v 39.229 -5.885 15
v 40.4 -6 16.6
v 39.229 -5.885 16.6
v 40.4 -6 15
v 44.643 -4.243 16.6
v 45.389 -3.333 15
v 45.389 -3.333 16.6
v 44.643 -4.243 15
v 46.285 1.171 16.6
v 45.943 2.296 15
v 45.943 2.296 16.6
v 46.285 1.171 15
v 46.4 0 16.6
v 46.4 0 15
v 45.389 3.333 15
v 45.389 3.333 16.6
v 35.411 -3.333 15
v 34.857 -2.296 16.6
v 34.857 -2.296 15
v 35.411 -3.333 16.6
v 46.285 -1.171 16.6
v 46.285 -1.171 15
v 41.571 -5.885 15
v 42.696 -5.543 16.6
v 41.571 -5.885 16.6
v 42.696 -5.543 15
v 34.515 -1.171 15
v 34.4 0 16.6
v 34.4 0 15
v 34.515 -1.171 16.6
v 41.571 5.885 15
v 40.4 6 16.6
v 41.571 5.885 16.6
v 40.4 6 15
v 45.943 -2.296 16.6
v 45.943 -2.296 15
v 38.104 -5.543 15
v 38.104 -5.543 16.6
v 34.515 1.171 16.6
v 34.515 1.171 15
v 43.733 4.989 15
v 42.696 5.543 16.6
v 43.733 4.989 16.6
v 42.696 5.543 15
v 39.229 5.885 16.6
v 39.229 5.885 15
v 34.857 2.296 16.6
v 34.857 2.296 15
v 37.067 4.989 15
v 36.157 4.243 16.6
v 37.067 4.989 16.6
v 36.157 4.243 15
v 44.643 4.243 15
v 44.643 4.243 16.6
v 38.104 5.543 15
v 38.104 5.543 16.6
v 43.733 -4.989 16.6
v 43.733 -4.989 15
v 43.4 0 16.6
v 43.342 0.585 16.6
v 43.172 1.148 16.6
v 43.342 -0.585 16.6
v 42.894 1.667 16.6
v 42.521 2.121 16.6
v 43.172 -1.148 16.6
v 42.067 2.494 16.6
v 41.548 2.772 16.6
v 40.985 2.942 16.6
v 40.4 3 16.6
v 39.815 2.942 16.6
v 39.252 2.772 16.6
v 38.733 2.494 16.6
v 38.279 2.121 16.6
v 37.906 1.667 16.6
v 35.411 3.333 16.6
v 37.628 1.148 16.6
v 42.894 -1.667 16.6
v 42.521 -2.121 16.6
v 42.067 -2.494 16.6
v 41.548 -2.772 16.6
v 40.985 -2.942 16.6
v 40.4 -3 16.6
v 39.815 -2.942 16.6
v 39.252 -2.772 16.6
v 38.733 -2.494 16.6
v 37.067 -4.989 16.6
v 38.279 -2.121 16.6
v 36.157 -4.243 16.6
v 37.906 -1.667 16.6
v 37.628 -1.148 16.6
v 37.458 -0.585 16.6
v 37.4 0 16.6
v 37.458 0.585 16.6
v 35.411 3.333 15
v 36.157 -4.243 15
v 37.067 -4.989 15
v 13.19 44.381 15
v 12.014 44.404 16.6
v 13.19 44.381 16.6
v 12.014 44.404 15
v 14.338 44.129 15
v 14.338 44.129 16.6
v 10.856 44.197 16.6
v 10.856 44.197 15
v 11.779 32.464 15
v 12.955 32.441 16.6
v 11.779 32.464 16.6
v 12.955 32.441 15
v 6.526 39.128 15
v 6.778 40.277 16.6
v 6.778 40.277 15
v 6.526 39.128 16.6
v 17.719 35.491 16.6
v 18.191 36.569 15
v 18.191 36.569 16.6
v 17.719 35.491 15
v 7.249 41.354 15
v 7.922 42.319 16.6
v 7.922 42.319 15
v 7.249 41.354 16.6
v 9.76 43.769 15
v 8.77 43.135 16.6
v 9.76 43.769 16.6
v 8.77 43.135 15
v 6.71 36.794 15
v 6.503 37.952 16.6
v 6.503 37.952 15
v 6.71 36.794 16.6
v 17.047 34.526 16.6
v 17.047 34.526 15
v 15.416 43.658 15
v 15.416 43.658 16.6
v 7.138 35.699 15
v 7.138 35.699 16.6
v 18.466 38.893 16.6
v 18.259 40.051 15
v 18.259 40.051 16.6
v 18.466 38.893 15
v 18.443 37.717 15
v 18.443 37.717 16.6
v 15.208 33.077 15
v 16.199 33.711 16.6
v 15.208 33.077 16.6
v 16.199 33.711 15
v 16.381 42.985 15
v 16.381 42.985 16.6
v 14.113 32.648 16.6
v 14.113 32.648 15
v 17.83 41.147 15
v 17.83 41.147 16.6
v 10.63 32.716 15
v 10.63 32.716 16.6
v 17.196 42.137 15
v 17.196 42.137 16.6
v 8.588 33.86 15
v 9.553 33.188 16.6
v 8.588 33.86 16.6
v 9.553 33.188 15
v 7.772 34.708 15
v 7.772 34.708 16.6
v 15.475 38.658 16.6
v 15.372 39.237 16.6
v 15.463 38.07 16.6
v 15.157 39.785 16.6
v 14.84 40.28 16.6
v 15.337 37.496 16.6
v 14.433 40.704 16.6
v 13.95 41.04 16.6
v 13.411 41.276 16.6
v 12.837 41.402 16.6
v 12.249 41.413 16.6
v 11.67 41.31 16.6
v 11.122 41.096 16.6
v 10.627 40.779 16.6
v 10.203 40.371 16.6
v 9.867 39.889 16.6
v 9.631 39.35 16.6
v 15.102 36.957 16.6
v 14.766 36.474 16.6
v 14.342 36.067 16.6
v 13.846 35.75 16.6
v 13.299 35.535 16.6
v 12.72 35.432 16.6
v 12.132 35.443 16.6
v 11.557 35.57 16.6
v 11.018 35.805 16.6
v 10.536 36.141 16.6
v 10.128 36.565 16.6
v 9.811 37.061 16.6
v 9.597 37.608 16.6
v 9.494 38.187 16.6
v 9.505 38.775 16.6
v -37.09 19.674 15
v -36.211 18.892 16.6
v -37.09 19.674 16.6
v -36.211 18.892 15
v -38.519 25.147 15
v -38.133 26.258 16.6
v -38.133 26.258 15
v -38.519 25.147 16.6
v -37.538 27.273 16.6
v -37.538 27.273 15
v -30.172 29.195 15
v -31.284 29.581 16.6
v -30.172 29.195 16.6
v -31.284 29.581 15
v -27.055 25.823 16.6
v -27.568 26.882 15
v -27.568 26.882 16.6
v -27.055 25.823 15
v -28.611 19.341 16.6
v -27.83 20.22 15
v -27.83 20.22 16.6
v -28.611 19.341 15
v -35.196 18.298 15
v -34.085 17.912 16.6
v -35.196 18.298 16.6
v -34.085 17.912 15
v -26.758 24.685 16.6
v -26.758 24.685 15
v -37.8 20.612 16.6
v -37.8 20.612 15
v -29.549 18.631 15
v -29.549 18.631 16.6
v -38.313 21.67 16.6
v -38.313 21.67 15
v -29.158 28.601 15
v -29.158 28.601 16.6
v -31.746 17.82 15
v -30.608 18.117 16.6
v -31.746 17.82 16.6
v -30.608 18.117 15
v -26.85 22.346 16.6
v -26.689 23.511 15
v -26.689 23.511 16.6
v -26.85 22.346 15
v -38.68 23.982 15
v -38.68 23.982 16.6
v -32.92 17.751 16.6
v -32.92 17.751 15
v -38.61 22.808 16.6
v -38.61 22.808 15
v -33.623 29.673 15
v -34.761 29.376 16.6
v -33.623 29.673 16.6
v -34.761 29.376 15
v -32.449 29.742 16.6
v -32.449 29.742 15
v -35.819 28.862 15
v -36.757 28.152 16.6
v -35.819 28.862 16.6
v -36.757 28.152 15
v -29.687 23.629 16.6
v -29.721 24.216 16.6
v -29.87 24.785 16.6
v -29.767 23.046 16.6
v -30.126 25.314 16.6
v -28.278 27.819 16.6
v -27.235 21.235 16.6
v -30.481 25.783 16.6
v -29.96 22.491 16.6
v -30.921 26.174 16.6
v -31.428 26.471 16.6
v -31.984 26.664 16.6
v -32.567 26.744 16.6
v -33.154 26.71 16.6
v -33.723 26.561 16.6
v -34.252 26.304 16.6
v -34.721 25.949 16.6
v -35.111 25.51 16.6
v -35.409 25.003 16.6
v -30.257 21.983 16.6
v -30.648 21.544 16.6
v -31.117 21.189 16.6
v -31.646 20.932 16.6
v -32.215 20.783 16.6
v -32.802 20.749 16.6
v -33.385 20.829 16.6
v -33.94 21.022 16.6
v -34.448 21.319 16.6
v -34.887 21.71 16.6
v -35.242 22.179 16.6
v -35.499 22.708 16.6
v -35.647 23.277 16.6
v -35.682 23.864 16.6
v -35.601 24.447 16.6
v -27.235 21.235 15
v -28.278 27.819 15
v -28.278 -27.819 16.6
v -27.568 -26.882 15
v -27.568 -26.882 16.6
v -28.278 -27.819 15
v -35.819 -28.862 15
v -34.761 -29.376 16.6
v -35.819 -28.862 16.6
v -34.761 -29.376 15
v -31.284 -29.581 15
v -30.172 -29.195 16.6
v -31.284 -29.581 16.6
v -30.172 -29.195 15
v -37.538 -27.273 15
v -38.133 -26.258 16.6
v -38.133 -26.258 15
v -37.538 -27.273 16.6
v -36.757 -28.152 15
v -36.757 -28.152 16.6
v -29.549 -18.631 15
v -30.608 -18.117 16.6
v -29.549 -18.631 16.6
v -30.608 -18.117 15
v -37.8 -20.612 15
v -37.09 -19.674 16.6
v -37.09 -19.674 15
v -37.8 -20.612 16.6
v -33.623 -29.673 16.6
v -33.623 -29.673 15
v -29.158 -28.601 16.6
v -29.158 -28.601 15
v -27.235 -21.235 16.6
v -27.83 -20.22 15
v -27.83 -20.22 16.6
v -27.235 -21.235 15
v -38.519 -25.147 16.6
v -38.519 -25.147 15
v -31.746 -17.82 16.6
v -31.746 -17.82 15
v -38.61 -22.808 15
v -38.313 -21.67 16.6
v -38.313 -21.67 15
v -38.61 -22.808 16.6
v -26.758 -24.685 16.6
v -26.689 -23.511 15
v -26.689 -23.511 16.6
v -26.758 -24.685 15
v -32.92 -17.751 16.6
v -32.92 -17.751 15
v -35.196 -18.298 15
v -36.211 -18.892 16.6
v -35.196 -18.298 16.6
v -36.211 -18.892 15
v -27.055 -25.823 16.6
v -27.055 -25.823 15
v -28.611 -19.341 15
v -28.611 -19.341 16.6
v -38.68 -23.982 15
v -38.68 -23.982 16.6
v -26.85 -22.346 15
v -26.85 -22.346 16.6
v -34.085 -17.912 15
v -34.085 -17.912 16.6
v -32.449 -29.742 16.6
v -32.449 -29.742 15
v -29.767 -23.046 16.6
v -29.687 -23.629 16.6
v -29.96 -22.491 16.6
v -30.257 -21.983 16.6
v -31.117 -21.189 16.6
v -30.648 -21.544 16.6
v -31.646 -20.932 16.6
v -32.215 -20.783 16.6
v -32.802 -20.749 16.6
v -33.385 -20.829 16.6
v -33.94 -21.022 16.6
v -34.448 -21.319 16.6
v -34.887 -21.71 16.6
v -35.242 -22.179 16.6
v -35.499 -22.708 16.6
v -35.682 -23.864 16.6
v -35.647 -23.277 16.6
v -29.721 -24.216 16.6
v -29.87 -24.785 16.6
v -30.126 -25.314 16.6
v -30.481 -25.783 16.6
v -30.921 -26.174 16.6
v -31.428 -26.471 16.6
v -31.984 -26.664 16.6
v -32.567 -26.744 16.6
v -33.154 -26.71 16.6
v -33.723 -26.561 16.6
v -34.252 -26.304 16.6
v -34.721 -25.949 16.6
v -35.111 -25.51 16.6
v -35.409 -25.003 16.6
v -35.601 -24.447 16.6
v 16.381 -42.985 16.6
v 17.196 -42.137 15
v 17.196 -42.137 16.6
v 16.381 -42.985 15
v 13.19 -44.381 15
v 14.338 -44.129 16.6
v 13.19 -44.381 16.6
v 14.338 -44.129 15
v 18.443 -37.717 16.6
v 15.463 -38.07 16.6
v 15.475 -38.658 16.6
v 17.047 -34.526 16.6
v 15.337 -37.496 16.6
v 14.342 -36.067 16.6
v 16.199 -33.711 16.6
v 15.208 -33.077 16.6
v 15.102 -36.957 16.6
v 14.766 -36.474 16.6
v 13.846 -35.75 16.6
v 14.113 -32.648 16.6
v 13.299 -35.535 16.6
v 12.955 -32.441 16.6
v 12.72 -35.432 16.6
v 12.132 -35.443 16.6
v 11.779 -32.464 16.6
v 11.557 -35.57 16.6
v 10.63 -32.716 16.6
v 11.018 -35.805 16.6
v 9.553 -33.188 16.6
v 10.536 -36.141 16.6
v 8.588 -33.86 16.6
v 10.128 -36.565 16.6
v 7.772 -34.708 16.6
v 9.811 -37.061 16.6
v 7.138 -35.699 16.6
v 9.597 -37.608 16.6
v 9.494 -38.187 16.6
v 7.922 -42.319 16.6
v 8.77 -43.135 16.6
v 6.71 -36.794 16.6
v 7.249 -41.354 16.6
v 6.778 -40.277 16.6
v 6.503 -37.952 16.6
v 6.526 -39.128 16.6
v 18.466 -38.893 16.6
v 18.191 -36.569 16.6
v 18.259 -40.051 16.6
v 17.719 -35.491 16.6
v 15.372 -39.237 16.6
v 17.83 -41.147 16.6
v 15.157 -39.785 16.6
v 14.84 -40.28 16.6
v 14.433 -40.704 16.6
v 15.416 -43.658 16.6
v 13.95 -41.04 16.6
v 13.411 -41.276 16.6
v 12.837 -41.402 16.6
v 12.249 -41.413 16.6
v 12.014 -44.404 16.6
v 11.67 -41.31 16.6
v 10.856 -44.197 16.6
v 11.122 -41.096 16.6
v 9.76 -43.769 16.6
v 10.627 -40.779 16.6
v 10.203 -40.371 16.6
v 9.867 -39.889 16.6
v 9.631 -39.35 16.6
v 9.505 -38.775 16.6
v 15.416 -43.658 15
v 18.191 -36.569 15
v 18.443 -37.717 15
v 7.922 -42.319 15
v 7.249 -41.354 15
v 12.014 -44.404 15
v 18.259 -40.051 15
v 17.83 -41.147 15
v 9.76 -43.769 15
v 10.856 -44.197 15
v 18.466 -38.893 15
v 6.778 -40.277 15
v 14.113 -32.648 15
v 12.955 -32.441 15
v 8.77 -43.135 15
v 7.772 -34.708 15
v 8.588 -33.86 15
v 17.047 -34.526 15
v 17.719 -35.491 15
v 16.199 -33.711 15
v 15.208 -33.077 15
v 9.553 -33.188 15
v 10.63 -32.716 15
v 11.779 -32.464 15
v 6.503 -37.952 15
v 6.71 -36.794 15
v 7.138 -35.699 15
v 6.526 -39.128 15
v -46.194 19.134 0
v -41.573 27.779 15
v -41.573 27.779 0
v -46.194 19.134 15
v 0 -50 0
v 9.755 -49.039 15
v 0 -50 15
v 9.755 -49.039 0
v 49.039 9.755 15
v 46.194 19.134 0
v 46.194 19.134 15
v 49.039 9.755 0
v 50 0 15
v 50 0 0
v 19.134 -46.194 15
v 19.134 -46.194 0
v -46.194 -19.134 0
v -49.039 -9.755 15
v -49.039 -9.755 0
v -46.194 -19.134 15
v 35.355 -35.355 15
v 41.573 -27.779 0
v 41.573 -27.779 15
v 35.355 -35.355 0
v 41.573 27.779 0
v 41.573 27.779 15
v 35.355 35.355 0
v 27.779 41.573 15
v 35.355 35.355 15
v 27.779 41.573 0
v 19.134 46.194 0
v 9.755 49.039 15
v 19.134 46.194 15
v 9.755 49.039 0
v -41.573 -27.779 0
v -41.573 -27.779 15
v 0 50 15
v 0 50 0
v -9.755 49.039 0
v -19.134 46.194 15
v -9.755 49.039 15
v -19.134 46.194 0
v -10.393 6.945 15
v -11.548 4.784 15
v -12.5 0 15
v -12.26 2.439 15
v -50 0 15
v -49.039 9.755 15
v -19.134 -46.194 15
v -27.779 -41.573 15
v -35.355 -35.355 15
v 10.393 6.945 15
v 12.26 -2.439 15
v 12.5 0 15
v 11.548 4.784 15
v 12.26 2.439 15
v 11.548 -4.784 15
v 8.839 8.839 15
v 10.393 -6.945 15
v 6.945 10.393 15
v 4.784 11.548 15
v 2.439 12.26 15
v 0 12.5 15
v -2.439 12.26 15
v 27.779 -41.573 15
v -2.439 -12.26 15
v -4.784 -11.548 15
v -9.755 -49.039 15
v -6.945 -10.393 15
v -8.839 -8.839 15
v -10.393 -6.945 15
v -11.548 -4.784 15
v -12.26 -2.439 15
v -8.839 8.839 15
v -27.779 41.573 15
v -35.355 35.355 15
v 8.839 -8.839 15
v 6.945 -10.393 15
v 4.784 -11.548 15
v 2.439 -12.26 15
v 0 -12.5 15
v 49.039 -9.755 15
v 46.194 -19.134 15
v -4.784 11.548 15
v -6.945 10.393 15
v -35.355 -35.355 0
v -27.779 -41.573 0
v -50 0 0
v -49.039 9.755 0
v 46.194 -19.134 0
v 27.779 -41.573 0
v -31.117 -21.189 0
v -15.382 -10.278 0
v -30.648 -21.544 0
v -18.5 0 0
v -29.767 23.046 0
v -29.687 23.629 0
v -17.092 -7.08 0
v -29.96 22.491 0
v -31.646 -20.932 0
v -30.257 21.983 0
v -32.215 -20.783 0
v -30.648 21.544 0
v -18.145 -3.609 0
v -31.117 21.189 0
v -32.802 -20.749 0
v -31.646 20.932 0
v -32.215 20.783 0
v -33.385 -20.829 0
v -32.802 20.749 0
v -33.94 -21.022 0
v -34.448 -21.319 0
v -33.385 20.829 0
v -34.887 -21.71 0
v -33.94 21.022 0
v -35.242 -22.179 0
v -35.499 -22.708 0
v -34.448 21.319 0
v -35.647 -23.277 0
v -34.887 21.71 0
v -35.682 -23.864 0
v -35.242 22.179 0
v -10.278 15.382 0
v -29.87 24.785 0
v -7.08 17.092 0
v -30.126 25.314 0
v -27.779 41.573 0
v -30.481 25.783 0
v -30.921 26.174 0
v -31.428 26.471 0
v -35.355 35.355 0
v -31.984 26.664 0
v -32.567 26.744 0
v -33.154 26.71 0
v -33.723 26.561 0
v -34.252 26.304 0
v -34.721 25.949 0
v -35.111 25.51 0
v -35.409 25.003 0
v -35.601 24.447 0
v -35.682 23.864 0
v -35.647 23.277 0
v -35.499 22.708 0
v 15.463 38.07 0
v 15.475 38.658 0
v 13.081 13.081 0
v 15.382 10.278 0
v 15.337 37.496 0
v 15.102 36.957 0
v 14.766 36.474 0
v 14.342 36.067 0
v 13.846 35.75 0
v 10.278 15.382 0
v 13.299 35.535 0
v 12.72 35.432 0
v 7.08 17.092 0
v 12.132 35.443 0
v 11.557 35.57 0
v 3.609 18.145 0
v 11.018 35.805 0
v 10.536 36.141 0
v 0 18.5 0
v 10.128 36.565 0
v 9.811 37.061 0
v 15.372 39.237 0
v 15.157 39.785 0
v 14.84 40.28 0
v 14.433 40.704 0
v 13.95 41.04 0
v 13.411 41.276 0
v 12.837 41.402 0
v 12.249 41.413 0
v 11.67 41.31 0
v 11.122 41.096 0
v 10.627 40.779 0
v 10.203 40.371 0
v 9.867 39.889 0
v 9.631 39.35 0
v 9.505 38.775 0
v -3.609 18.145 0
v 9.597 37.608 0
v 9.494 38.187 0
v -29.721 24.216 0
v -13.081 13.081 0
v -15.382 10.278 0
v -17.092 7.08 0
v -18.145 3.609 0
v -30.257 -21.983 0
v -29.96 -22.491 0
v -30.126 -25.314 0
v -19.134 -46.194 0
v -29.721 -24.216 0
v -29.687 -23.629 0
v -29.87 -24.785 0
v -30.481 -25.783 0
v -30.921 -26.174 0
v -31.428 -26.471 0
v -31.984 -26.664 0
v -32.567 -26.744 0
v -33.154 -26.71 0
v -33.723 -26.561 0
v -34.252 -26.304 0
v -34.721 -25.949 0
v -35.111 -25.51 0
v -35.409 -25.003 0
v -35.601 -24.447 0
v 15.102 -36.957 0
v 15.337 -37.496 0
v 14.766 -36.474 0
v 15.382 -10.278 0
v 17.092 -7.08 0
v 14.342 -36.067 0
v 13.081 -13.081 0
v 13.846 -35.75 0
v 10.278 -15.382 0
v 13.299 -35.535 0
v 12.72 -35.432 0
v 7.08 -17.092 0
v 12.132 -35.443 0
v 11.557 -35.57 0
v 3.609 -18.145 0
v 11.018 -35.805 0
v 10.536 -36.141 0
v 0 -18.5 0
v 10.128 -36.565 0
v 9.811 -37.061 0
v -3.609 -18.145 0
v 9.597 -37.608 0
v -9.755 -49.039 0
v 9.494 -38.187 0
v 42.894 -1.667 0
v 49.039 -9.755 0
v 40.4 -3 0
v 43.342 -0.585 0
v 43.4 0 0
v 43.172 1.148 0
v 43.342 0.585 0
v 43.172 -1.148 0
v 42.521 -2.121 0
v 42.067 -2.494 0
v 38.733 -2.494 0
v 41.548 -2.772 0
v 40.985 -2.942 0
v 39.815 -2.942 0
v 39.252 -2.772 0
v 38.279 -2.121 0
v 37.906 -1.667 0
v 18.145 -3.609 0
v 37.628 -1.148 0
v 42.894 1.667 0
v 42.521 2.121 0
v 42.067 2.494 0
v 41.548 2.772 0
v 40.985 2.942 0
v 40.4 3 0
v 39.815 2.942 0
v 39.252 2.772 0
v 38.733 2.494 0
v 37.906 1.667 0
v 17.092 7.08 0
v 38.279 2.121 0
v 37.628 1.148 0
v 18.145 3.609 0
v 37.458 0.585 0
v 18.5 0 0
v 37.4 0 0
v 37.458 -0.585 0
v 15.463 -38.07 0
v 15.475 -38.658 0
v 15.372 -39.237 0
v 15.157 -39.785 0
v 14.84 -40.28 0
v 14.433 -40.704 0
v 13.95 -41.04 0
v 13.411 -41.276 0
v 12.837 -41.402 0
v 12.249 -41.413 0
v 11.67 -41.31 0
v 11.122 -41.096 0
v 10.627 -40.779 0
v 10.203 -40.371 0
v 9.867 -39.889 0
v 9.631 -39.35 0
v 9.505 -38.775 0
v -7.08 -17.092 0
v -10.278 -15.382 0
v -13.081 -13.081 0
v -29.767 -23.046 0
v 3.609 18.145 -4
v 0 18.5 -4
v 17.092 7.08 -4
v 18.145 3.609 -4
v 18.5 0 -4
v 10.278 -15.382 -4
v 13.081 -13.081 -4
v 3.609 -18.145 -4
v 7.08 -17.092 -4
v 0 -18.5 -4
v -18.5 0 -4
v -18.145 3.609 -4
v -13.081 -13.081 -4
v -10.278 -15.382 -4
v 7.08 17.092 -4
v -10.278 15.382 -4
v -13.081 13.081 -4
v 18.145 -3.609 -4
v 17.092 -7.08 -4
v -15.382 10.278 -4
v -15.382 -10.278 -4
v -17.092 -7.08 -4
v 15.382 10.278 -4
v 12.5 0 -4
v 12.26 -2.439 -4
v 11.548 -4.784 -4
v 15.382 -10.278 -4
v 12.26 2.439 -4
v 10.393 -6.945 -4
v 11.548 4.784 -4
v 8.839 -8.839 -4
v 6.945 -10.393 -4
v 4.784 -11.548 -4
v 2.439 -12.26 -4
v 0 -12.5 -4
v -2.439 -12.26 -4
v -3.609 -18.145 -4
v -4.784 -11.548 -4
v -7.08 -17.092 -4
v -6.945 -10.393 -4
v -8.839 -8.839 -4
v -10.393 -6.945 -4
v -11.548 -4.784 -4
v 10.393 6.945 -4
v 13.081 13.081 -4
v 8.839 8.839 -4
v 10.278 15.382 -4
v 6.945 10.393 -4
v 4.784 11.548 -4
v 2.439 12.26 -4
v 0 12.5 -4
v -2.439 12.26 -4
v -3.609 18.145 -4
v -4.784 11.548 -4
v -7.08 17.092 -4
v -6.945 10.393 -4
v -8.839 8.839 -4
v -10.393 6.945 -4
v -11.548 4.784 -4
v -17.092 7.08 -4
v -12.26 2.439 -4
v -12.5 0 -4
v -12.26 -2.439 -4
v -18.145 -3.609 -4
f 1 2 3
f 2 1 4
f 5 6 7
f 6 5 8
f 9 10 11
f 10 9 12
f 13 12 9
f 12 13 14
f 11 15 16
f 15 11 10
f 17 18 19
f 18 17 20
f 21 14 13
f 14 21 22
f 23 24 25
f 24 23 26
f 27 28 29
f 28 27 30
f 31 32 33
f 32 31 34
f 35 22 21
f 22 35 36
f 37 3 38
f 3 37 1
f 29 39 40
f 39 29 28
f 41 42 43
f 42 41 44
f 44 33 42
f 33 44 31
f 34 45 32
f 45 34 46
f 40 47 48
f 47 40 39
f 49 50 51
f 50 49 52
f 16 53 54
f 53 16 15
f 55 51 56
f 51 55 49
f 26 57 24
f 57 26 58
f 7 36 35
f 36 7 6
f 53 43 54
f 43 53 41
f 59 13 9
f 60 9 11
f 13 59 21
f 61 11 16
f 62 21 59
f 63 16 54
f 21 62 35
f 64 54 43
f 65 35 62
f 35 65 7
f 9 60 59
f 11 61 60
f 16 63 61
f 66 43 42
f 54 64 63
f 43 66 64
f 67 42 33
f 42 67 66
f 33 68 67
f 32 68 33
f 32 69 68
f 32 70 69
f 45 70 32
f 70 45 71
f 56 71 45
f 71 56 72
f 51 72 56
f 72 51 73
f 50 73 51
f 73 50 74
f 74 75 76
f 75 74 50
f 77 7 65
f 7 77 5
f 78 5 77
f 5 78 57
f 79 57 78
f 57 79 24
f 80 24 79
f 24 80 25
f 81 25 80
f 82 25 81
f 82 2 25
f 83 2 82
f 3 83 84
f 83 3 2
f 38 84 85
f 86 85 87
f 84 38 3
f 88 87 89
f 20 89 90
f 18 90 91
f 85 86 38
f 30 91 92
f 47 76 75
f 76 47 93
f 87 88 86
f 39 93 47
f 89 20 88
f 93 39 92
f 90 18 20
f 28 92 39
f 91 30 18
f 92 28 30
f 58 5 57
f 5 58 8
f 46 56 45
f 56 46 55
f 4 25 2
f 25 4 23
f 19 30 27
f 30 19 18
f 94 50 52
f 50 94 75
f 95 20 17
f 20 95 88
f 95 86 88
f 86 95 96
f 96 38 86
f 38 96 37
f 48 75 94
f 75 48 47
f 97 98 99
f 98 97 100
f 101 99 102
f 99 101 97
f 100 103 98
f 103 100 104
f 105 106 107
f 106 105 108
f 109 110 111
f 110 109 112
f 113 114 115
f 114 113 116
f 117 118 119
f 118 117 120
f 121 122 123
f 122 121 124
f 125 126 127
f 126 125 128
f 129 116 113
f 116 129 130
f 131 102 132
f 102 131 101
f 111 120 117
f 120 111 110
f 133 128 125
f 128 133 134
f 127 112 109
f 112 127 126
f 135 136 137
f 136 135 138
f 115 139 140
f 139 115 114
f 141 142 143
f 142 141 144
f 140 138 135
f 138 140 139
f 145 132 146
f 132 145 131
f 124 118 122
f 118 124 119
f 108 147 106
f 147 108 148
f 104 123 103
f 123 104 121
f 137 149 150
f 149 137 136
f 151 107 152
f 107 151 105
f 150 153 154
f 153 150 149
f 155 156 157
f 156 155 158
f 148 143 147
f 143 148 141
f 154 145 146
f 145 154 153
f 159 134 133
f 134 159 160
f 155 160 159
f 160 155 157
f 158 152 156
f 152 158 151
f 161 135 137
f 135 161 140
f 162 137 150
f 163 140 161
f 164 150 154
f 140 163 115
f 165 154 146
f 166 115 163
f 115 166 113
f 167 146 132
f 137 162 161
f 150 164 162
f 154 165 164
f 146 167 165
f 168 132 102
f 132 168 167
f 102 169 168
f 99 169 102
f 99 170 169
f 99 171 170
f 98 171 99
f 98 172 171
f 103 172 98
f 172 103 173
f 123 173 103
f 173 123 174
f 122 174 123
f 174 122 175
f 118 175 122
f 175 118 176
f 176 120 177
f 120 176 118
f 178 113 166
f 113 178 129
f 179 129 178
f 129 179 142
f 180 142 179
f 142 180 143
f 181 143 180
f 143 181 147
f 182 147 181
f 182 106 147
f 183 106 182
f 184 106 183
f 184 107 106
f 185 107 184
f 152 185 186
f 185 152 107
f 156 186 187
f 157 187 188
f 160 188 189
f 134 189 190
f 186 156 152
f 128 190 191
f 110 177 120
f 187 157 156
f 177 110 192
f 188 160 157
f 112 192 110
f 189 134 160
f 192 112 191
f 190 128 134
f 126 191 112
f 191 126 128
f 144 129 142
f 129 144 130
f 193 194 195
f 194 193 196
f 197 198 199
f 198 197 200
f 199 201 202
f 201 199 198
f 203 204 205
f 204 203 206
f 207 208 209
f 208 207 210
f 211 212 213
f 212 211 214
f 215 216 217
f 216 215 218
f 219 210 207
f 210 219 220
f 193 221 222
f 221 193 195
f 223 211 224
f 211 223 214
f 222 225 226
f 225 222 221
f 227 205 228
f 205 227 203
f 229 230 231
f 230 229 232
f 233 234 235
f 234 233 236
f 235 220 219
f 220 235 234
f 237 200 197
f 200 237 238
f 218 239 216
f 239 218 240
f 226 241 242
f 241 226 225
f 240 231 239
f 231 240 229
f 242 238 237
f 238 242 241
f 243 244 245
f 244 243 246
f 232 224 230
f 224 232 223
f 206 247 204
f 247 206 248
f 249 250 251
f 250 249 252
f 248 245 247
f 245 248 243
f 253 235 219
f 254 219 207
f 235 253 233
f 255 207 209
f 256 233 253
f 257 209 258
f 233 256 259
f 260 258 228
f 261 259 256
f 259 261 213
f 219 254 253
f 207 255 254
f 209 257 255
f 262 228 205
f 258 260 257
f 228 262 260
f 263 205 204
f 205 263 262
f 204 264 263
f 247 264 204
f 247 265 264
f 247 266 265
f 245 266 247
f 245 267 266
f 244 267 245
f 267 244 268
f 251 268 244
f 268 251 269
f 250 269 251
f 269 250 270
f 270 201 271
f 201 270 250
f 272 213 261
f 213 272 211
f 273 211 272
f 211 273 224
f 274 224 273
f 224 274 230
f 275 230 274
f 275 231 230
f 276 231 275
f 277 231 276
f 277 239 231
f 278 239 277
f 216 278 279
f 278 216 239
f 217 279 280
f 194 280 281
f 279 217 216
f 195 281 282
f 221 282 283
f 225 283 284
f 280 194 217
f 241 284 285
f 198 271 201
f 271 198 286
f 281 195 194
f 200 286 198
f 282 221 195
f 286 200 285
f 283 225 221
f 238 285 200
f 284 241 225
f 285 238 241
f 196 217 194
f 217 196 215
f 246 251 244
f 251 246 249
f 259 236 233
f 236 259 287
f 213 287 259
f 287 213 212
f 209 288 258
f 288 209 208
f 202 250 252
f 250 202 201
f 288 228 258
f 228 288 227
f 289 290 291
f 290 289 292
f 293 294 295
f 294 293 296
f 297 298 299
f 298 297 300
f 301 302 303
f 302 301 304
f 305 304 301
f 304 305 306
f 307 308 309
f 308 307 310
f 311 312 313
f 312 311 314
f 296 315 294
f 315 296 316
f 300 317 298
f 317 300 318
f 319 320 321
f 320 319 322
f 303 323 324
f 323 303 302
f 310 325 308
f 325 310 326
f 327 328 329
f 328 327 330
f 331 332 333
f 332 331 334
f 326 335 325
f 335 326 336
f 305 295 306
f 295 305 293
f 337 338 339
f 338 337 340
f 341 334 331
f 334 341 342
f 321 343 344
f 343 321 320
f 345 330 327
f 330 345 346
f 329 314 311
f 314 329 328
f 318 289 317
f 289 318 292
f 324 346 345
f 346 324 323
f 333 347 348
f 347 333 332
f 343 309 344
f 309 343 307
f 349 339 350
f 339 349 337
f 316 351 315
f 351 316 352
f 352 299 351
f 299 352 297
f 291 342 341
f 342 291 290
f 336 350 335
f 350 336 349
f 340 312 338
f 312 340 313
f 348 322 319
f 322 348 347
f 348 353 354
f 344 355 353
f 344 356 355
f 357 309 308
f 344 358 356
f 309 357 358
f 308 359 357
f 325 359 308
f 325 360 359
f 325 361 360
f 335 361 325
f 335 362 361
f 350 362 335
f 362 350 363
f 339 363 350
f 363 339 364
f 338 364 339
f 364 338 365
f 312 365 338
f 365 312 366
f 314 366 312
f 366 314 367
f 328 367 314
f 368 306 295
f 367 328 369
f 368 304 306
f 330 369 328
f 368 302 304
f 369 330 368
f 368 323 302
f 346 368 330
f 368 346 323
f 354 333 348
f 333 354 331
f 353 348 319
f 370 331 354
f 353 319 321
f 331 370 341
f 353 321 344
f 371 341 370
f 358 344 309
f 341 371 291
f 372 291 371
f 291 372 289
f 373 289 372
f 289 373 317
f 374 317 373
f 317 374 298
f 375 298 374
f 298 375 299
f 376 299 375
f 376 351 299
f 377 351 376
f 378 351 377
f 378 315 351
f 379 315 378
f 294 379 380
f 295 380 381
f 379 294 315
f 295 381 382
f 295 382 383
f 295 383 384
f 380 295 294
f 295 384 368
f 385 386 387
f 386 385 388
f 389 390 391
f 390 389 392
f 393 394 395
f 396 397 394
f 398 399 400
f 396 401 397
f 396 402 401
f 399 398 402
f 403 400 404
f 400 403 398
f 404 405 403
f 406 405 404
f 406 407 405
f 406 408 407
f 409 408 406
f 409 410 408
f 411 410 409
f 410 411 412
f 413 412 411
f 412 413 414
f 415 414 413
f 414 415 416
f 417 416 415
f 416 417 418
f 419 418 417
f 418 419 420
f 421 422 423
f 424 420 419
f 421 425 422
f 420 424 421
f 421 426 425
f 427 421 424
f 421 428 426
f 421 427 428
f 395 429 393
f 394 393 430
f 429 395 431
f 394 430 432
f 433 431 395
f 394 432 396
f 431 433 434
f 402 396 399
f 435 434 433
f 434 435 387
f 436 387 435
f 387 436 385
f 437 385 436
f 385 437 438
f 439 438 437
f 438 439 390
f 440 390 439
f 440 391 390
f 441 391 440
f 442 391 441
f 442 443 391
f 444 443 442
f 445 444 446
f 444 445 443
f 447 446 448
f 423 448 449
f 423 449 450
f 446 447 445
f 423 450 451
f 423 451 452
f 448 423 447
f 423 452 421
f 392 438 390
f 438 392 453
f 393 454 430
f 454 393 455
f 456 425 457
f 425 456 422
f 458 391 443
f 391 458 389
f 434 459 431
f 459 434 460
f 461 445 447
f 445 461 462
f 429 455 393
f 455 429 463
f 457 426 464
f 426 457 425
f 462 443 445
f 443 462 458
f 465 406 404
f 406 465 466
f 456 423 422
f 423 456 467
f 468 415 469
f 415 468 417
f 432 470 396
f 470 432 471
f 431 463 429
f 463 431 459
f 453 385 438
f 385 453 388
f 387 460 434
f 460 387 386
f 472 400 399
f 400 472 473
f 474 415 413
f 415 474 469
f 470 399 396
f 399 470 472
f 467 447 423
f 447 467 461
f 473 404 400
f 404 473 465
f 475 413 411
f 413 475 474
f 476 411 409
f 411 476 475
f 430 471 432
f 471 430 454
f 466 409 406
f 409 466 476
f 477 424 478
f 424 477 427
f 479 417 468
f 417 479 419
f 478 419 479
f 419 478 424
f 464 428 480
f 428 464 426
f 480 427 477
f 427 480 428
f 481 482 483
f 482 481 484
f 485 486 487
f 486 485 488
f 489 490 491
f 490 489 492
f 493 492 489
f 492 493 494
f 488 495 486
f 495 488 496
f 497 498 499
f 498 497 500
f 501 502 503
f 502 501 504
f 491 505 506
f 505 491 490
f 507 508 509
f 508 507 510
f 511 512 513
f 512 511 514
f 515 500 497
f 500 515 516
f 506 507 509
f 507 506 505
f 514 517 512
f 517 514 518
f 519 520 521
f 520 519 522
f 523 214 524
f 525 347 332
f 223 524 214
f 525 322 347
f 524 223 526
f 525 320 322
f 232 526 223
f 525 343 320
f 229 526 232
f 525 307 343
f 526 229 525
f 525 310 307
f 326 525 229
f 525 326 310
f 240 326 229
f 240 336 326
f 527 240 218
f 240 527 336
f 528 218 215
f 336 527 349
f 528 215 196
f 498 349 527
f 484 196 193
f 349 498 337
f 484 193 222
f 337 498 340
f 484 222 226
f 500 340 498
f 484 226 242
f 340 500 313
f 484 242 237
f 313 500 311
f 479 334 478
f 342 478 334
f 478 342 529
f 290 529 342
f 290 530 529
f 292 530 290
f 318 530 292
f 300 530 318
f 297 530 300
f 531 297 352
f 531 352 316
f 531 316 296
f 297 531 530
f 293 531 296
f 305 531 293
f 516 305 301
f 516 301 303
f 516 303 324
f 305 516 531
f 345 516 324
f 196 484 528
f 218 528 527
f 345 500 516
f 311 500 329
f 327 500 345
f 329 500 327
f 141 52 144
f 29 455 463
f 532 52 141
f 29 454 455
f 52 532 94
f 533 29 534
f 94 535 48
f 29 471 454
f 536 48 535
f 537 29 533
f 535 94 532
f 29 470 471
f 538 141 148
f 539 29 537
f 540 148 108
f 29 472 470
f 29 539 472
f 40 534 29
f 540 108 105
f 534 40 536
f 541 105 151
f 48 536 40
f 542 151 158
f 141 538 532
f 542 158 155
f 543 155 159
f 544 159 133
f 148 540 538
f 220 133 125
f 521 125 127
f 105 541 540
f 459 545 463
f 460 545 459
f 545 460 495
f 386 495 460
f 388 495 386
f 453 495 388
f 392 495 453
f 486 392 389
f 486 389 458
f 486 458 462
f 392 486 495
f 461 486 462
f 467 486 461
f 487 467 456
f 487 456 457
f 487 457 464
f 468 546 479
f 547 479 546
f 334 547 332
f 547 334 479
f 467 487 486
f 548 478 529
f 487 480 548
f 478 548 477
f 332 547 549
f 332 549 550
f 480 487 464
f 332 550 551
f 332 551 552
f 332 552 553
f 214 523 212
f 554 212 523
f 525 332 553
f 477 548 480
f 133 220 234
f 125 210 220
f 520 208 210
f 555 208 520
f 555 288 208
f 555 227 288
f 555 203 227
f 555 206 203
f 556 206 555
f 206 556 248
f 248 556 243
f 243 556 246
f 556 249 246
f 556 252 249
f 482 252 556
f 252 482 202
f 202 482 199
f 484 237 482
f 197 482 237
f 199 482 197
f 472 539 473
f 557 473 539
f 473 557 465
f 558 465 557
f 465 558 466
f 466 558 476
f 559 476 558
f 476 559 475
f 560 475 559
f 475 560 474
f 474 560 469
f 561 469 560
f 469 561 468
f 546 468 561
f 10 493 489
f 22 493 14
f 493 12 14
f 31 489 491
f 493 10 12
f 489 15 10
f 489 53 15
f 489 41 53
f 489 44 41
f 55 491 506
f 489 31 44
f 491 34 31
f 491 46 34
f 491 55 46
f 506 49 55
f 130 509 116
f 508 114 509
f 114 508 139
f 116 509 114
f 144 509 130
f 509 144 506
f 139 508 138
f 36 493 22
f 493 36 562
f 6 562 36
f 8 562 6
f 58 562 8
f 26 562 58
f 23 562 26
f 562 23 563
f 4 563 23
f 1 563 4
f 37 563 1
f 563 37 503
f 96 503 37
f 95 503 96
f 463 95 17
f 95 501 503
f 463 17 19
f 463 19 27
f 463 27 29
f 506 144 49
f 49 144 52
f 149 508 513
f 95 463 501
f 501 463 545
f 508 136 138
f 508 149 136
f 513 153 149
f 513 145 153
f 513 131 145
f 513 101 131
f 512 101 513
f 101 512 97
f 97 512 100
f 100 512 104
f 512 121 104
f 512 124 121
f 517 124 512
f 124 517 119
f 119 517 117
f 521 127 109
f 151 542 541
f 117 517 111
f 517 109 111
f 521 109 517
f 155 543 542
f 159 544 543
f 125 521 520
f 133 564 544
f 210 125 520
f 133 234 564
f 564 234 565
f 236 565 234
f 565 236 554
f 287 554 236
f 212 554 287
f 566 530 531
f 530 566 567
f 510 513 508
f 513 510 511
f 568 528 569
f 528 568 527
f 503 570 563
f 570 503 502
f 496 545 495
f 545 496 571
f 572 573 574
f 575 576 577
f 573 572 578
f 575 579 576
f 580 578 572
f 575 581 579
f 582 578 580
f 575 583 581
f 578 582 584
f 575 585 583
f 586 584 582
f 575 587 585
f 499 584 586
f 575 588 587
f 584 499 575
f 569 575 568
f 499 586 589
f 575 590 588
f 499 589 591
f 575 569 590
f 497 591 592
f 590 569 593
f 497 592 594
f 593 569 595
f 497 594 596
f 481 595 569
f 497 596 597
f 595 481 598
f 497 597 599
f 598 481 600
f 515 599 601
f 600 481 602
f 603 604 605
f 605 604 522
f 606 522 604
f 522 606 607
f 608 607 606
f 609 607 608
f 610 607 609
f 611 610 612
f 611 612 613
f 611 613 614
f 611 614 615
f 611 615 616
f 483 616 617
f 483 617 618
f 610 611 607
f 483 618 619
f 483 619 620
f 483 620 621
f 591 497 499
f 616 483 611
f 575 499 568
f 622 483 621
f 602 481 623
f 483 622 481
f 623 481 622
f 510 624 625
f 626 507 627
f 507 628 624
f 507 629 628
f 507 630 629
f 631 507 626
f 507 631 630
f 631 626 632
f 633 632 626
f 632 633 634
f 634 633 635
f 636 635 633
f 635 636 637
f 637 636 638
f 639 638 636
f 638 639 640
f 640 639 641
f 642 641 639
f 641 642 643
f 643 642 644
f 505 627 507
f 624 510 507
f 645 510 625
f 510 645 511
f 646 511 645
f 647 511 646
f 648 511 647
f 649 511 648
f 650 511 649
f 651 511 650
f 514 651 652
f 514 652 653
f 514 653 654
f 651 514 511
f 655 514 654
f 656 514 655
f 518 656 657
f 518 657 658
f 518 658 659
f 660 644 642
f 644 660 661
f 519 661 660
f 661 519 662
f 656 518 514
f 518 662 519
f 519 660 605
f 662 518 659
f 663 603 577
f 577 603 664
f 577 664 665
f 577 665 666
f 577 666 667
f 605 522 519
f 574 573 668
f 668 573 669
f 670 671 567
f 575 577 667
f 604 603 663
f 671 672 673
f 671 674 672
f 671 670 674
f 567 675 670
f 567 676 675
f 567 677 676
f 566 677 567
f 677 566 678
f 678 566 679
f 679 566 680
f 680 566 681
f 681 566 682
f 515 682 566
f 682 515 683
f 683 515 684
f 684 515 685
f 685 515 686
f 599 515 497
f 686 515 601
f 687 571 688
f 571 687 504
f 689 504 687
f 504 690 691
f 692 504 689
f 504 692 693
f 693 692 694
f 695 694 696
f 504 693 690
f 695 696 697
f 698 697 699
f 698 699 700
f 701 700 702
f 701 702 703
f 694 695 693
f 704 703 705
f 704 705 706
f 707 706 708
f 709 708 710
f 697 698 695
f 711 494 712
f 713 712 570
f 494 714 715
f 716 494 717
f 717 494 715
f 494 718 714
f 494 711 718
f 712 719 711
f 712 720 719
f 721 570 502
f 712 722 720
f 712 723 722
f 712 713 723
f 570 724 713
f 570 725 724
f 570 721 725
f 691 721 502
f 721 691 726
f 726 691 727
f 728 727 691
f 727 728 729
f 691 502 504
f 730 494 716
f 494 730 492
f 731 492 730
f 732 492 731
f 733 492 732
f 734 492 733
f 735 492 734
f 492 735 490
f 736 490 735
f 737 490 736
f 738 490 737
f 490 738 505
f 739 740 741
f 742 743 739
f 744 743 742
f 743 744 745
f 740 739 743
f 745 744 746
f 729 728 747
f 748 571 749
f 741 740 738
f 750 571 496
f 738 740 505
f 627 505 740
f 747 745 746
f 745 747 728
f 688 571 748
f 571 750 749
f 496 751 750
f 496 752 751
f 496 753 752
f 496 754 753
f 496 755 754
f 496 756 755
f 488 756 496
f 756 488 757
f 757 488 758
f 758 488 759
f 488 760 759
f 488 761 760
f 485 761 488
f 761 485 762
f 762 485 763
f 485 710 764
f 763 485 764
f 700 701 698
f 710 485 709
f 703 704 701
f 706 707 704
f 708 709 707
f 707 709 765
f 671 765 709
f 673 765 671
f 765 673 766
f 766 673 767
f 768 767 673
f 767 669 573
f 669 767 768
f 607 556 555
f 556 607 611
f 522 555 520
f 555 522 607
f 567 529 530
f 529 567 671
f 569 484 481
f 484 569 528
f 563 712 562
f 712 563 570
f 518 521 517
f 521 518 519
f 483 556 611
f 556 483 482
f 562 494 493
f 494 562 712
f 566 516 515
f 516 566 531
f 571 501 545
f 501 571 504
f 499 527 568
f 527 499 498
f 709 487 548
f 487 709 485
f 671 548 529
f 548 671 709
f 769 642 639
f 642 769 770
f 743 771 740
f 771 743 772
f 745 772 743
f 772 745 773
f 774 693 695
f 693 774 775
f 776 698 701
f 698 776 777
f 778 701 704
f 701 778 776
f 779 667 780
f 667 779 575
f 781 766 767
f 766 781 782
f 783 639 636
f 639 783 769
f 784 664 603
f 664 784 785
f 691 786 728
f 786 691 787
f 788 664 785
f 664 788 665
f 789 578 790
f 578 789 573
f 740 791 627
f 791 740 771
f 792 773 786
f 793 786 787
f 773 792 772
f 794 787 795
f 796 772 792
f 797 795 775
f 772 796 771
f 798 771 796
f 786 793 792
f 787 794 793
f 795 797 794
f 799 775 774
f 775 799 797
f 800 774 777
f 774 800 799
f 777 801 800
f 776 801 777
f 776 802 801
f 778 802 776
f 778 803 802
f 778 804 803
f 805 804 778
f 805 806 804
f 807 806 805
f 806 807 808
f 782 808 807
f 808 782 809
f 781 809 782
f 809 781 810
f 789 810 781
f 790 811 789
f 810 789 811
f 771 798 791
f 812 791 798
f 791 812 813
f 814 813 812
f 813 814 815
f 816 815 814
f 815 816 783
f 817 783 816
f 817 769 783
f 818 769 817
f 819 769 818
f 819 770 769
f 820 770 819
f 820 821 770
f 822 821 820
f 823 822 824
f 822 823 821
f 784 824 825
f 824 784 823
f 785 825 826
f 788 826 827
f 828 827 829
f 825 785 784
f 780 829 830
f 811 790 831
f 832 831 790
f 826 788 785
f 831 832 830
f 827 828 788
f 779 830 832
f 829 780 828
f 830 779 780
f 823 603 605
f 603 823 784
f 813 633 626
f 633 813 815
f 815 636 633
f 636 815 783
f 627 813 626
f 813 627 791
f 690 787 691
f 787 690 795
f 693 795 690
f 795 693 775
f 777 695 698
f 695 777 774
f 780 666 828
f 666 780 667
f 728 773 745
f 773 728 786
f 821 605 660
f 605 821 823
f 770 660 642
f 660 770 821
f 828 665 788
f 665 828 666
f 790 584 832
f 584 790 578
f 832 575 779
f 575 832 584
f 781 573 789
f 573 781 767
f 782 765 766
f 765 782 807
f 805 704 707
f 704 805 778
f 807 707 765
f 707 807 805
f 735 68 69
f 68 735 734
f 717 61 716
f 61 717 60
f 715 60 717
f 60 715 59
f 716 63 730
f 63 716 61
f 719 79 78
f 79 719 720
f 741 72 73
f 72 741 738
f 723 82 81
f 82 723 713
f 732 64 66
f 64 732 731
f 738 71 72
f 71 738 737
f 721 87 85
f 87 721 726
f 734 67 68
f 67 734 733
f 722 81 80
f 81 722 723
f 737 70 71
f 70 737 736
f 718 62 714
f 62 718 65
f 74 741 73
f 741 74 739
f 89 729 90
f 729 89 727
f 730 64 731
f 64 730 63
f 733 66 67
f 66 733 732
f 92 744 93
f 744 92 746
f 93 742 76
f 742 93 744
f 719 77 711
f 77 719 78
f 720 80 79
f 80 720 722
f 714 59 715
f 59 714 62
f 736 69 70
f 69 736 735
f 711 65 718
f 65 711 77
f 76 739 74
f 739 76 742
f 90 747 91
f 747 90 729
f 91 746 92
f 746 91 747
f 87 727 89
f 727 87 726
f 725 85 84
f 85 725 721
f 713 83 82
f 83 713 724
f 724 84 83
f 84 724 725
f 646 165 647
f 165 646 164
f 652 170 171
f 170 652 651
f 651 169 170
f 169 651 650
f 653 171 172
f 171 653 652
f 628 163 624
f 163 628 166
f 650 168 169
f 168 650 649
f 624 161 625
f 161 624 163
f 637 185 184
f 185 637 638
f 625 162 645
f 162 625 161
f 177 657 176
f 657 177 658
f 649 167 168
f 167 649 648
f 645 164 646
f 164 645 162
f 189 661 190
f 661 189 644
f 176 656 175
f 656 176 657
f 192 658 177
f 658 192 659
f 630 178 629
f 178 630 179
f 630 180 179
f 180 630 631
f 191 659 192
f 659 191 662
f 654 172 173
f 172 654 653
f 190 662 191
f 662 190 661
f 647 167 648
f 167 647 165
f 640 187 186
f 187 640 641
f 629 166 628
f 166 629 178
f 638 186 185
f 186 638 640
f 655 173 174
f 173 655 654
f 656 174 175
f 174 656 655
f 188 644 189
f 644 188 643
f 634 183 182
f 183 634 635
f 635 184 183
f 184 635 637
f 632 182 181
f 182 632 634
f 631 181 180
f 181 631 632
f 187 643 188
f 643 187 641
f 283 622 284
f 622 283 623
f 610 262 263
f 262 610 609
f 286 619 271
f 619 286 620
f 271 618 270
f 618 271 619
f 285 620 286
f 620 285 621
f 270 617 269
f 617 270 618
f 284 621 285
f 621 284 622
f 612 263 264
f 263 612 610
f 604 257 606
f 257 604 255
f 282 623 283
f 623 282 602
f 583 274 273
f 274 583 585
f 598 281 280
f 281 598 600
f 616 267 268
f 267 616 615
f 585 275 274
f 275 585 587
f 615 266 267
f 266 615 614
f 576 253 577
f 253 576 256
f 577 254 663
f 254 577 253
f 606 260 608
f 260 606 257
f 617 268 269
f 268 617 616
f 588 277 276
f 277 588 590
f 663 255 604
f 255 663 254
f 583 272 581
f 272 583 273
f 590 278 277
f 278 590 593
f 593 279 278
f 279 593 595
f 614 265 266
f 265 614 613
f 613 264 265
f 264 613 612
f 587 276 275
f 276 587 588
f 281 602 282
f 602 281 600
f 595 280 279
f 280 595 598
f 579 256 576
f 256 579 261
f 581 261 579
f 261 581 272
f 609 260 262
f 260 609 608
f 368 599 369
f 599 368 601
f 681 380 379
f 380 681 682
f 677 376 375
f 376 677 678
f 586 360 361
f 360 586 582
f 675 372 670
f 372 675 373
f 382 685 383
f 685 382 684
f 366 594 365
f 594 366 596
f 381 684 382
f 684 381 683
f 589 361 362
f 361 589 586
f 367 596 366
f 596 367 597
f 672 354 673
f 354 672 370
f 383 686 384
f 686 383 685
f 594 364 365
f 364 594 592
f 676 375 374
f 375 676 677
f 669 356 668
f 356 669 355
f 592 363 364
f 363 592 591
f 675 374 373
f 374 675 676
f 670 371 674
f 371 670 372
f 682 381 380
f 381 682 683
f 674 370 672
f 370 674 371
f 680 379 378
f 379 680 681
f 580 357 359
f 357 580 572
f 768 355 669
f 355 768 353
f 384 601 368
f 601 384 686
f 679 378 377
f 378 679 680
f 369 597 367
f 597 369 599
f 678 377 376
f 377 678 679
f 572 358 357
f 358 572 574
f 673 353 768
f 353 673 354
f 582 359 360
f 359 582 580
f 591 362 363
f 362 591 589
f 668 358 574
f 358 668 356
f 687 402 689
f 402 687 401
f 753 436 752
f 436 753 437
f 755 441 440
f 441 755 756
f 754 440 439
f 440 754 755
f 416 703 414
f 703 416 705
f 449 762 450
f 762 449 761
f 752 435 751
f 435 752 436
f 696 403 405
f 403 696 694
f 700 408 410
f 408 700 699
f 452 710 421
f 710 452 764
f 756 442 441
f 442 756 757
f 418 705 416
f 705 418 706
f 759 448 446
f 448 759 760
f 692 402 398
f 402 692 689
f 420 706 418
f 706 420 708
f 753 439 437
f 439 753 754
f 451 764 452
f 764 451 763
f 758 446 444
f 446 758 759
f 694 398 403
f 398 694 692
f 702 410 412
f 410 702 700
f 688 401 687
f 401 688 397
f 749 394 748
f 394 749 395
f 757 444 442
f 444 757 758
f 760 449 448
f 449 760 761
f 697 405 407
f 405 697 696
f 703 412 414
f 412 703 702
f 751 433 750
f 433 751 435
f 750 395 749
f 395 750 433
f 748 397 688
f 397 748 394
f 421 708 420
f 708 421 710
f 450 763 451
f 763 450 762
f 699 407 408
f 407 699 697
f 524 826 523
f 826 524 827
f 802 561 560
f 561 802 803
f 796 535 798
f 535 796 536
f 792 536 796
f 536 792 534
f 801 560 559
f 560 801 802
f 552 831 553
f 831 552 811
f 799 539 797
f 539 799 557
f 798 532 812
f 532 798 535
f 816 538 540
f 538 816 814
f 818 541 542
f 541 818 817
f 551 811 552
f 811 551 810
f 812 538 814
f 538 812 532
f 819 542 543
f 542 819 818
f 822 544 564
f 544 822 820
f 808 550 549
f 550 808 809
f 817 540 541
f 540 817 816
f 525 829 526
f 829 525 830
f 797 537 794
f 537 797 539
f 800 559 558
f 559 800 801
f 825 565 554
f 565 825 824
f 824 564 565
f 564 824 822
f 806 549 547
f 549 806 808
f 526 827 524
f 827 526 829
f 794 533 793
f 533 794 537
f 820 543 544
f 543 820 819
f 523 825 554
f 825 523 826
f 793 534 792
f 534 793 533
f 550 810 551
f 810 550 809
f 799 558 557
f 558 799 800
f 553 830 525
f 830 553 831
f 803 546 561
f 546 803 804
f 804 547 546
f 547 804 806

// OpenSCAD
$fn = 32;

// ----------------------------------------------------------------------
// Bolt-circle flange: 100 mm outside, 5 bolt holes, bore 25 mm
// ----------------------------------------------------------------------

// --- parameters (mm) ---
flange_d = 100;           // flange outside diameter
flange_t = 15;            // flange thickness
bolts = 5;                // number of bolt holes
bolt_d = 6;               // bolt clearance
bolt_r = 40.4;            // bolt circle radius
bore_d = 25;              // centre bore
spigot_d = 37;            // spigot diameter
spigot_h = 5;             // spigot height below the flange
sink = 1;                 // overlap into the flange
spot_d = 12;              // spot faced bosses
spot_h = 1.6;             // spot face height

module body() {
  cylinder(h = flange_t, d = flange_d);
  /* spigot on the back face, sunk into the flange */
  translate([0, 0, -spigot_h + sink]) cylinder(h = spigot_h, d = spigot_d);
  /* spot faced pads under the bolt heads */
  for (i = [0 : bolts - 1]) rotate([0, 0, i * 360 / bolts]) translate([bolt_r, 0, flange_t - 1]) cylinder(h = spot_h + 1, d = spot_d);
}

difference() {
  body();
  /* bolt circle */
  for (i = [0 : bolts - 1]) rotate([0, 0, i * 360 / bolts]) translate([bolt_r, 0, -spigot_h - 1]) cylinder(h = flange_t + spigot_h + 3, d = bolt_d);
  translate([0, 0, -spigot_h - 1]) cylinder(h = flange_t + spigot_h + 3, d = bore_d);
}
